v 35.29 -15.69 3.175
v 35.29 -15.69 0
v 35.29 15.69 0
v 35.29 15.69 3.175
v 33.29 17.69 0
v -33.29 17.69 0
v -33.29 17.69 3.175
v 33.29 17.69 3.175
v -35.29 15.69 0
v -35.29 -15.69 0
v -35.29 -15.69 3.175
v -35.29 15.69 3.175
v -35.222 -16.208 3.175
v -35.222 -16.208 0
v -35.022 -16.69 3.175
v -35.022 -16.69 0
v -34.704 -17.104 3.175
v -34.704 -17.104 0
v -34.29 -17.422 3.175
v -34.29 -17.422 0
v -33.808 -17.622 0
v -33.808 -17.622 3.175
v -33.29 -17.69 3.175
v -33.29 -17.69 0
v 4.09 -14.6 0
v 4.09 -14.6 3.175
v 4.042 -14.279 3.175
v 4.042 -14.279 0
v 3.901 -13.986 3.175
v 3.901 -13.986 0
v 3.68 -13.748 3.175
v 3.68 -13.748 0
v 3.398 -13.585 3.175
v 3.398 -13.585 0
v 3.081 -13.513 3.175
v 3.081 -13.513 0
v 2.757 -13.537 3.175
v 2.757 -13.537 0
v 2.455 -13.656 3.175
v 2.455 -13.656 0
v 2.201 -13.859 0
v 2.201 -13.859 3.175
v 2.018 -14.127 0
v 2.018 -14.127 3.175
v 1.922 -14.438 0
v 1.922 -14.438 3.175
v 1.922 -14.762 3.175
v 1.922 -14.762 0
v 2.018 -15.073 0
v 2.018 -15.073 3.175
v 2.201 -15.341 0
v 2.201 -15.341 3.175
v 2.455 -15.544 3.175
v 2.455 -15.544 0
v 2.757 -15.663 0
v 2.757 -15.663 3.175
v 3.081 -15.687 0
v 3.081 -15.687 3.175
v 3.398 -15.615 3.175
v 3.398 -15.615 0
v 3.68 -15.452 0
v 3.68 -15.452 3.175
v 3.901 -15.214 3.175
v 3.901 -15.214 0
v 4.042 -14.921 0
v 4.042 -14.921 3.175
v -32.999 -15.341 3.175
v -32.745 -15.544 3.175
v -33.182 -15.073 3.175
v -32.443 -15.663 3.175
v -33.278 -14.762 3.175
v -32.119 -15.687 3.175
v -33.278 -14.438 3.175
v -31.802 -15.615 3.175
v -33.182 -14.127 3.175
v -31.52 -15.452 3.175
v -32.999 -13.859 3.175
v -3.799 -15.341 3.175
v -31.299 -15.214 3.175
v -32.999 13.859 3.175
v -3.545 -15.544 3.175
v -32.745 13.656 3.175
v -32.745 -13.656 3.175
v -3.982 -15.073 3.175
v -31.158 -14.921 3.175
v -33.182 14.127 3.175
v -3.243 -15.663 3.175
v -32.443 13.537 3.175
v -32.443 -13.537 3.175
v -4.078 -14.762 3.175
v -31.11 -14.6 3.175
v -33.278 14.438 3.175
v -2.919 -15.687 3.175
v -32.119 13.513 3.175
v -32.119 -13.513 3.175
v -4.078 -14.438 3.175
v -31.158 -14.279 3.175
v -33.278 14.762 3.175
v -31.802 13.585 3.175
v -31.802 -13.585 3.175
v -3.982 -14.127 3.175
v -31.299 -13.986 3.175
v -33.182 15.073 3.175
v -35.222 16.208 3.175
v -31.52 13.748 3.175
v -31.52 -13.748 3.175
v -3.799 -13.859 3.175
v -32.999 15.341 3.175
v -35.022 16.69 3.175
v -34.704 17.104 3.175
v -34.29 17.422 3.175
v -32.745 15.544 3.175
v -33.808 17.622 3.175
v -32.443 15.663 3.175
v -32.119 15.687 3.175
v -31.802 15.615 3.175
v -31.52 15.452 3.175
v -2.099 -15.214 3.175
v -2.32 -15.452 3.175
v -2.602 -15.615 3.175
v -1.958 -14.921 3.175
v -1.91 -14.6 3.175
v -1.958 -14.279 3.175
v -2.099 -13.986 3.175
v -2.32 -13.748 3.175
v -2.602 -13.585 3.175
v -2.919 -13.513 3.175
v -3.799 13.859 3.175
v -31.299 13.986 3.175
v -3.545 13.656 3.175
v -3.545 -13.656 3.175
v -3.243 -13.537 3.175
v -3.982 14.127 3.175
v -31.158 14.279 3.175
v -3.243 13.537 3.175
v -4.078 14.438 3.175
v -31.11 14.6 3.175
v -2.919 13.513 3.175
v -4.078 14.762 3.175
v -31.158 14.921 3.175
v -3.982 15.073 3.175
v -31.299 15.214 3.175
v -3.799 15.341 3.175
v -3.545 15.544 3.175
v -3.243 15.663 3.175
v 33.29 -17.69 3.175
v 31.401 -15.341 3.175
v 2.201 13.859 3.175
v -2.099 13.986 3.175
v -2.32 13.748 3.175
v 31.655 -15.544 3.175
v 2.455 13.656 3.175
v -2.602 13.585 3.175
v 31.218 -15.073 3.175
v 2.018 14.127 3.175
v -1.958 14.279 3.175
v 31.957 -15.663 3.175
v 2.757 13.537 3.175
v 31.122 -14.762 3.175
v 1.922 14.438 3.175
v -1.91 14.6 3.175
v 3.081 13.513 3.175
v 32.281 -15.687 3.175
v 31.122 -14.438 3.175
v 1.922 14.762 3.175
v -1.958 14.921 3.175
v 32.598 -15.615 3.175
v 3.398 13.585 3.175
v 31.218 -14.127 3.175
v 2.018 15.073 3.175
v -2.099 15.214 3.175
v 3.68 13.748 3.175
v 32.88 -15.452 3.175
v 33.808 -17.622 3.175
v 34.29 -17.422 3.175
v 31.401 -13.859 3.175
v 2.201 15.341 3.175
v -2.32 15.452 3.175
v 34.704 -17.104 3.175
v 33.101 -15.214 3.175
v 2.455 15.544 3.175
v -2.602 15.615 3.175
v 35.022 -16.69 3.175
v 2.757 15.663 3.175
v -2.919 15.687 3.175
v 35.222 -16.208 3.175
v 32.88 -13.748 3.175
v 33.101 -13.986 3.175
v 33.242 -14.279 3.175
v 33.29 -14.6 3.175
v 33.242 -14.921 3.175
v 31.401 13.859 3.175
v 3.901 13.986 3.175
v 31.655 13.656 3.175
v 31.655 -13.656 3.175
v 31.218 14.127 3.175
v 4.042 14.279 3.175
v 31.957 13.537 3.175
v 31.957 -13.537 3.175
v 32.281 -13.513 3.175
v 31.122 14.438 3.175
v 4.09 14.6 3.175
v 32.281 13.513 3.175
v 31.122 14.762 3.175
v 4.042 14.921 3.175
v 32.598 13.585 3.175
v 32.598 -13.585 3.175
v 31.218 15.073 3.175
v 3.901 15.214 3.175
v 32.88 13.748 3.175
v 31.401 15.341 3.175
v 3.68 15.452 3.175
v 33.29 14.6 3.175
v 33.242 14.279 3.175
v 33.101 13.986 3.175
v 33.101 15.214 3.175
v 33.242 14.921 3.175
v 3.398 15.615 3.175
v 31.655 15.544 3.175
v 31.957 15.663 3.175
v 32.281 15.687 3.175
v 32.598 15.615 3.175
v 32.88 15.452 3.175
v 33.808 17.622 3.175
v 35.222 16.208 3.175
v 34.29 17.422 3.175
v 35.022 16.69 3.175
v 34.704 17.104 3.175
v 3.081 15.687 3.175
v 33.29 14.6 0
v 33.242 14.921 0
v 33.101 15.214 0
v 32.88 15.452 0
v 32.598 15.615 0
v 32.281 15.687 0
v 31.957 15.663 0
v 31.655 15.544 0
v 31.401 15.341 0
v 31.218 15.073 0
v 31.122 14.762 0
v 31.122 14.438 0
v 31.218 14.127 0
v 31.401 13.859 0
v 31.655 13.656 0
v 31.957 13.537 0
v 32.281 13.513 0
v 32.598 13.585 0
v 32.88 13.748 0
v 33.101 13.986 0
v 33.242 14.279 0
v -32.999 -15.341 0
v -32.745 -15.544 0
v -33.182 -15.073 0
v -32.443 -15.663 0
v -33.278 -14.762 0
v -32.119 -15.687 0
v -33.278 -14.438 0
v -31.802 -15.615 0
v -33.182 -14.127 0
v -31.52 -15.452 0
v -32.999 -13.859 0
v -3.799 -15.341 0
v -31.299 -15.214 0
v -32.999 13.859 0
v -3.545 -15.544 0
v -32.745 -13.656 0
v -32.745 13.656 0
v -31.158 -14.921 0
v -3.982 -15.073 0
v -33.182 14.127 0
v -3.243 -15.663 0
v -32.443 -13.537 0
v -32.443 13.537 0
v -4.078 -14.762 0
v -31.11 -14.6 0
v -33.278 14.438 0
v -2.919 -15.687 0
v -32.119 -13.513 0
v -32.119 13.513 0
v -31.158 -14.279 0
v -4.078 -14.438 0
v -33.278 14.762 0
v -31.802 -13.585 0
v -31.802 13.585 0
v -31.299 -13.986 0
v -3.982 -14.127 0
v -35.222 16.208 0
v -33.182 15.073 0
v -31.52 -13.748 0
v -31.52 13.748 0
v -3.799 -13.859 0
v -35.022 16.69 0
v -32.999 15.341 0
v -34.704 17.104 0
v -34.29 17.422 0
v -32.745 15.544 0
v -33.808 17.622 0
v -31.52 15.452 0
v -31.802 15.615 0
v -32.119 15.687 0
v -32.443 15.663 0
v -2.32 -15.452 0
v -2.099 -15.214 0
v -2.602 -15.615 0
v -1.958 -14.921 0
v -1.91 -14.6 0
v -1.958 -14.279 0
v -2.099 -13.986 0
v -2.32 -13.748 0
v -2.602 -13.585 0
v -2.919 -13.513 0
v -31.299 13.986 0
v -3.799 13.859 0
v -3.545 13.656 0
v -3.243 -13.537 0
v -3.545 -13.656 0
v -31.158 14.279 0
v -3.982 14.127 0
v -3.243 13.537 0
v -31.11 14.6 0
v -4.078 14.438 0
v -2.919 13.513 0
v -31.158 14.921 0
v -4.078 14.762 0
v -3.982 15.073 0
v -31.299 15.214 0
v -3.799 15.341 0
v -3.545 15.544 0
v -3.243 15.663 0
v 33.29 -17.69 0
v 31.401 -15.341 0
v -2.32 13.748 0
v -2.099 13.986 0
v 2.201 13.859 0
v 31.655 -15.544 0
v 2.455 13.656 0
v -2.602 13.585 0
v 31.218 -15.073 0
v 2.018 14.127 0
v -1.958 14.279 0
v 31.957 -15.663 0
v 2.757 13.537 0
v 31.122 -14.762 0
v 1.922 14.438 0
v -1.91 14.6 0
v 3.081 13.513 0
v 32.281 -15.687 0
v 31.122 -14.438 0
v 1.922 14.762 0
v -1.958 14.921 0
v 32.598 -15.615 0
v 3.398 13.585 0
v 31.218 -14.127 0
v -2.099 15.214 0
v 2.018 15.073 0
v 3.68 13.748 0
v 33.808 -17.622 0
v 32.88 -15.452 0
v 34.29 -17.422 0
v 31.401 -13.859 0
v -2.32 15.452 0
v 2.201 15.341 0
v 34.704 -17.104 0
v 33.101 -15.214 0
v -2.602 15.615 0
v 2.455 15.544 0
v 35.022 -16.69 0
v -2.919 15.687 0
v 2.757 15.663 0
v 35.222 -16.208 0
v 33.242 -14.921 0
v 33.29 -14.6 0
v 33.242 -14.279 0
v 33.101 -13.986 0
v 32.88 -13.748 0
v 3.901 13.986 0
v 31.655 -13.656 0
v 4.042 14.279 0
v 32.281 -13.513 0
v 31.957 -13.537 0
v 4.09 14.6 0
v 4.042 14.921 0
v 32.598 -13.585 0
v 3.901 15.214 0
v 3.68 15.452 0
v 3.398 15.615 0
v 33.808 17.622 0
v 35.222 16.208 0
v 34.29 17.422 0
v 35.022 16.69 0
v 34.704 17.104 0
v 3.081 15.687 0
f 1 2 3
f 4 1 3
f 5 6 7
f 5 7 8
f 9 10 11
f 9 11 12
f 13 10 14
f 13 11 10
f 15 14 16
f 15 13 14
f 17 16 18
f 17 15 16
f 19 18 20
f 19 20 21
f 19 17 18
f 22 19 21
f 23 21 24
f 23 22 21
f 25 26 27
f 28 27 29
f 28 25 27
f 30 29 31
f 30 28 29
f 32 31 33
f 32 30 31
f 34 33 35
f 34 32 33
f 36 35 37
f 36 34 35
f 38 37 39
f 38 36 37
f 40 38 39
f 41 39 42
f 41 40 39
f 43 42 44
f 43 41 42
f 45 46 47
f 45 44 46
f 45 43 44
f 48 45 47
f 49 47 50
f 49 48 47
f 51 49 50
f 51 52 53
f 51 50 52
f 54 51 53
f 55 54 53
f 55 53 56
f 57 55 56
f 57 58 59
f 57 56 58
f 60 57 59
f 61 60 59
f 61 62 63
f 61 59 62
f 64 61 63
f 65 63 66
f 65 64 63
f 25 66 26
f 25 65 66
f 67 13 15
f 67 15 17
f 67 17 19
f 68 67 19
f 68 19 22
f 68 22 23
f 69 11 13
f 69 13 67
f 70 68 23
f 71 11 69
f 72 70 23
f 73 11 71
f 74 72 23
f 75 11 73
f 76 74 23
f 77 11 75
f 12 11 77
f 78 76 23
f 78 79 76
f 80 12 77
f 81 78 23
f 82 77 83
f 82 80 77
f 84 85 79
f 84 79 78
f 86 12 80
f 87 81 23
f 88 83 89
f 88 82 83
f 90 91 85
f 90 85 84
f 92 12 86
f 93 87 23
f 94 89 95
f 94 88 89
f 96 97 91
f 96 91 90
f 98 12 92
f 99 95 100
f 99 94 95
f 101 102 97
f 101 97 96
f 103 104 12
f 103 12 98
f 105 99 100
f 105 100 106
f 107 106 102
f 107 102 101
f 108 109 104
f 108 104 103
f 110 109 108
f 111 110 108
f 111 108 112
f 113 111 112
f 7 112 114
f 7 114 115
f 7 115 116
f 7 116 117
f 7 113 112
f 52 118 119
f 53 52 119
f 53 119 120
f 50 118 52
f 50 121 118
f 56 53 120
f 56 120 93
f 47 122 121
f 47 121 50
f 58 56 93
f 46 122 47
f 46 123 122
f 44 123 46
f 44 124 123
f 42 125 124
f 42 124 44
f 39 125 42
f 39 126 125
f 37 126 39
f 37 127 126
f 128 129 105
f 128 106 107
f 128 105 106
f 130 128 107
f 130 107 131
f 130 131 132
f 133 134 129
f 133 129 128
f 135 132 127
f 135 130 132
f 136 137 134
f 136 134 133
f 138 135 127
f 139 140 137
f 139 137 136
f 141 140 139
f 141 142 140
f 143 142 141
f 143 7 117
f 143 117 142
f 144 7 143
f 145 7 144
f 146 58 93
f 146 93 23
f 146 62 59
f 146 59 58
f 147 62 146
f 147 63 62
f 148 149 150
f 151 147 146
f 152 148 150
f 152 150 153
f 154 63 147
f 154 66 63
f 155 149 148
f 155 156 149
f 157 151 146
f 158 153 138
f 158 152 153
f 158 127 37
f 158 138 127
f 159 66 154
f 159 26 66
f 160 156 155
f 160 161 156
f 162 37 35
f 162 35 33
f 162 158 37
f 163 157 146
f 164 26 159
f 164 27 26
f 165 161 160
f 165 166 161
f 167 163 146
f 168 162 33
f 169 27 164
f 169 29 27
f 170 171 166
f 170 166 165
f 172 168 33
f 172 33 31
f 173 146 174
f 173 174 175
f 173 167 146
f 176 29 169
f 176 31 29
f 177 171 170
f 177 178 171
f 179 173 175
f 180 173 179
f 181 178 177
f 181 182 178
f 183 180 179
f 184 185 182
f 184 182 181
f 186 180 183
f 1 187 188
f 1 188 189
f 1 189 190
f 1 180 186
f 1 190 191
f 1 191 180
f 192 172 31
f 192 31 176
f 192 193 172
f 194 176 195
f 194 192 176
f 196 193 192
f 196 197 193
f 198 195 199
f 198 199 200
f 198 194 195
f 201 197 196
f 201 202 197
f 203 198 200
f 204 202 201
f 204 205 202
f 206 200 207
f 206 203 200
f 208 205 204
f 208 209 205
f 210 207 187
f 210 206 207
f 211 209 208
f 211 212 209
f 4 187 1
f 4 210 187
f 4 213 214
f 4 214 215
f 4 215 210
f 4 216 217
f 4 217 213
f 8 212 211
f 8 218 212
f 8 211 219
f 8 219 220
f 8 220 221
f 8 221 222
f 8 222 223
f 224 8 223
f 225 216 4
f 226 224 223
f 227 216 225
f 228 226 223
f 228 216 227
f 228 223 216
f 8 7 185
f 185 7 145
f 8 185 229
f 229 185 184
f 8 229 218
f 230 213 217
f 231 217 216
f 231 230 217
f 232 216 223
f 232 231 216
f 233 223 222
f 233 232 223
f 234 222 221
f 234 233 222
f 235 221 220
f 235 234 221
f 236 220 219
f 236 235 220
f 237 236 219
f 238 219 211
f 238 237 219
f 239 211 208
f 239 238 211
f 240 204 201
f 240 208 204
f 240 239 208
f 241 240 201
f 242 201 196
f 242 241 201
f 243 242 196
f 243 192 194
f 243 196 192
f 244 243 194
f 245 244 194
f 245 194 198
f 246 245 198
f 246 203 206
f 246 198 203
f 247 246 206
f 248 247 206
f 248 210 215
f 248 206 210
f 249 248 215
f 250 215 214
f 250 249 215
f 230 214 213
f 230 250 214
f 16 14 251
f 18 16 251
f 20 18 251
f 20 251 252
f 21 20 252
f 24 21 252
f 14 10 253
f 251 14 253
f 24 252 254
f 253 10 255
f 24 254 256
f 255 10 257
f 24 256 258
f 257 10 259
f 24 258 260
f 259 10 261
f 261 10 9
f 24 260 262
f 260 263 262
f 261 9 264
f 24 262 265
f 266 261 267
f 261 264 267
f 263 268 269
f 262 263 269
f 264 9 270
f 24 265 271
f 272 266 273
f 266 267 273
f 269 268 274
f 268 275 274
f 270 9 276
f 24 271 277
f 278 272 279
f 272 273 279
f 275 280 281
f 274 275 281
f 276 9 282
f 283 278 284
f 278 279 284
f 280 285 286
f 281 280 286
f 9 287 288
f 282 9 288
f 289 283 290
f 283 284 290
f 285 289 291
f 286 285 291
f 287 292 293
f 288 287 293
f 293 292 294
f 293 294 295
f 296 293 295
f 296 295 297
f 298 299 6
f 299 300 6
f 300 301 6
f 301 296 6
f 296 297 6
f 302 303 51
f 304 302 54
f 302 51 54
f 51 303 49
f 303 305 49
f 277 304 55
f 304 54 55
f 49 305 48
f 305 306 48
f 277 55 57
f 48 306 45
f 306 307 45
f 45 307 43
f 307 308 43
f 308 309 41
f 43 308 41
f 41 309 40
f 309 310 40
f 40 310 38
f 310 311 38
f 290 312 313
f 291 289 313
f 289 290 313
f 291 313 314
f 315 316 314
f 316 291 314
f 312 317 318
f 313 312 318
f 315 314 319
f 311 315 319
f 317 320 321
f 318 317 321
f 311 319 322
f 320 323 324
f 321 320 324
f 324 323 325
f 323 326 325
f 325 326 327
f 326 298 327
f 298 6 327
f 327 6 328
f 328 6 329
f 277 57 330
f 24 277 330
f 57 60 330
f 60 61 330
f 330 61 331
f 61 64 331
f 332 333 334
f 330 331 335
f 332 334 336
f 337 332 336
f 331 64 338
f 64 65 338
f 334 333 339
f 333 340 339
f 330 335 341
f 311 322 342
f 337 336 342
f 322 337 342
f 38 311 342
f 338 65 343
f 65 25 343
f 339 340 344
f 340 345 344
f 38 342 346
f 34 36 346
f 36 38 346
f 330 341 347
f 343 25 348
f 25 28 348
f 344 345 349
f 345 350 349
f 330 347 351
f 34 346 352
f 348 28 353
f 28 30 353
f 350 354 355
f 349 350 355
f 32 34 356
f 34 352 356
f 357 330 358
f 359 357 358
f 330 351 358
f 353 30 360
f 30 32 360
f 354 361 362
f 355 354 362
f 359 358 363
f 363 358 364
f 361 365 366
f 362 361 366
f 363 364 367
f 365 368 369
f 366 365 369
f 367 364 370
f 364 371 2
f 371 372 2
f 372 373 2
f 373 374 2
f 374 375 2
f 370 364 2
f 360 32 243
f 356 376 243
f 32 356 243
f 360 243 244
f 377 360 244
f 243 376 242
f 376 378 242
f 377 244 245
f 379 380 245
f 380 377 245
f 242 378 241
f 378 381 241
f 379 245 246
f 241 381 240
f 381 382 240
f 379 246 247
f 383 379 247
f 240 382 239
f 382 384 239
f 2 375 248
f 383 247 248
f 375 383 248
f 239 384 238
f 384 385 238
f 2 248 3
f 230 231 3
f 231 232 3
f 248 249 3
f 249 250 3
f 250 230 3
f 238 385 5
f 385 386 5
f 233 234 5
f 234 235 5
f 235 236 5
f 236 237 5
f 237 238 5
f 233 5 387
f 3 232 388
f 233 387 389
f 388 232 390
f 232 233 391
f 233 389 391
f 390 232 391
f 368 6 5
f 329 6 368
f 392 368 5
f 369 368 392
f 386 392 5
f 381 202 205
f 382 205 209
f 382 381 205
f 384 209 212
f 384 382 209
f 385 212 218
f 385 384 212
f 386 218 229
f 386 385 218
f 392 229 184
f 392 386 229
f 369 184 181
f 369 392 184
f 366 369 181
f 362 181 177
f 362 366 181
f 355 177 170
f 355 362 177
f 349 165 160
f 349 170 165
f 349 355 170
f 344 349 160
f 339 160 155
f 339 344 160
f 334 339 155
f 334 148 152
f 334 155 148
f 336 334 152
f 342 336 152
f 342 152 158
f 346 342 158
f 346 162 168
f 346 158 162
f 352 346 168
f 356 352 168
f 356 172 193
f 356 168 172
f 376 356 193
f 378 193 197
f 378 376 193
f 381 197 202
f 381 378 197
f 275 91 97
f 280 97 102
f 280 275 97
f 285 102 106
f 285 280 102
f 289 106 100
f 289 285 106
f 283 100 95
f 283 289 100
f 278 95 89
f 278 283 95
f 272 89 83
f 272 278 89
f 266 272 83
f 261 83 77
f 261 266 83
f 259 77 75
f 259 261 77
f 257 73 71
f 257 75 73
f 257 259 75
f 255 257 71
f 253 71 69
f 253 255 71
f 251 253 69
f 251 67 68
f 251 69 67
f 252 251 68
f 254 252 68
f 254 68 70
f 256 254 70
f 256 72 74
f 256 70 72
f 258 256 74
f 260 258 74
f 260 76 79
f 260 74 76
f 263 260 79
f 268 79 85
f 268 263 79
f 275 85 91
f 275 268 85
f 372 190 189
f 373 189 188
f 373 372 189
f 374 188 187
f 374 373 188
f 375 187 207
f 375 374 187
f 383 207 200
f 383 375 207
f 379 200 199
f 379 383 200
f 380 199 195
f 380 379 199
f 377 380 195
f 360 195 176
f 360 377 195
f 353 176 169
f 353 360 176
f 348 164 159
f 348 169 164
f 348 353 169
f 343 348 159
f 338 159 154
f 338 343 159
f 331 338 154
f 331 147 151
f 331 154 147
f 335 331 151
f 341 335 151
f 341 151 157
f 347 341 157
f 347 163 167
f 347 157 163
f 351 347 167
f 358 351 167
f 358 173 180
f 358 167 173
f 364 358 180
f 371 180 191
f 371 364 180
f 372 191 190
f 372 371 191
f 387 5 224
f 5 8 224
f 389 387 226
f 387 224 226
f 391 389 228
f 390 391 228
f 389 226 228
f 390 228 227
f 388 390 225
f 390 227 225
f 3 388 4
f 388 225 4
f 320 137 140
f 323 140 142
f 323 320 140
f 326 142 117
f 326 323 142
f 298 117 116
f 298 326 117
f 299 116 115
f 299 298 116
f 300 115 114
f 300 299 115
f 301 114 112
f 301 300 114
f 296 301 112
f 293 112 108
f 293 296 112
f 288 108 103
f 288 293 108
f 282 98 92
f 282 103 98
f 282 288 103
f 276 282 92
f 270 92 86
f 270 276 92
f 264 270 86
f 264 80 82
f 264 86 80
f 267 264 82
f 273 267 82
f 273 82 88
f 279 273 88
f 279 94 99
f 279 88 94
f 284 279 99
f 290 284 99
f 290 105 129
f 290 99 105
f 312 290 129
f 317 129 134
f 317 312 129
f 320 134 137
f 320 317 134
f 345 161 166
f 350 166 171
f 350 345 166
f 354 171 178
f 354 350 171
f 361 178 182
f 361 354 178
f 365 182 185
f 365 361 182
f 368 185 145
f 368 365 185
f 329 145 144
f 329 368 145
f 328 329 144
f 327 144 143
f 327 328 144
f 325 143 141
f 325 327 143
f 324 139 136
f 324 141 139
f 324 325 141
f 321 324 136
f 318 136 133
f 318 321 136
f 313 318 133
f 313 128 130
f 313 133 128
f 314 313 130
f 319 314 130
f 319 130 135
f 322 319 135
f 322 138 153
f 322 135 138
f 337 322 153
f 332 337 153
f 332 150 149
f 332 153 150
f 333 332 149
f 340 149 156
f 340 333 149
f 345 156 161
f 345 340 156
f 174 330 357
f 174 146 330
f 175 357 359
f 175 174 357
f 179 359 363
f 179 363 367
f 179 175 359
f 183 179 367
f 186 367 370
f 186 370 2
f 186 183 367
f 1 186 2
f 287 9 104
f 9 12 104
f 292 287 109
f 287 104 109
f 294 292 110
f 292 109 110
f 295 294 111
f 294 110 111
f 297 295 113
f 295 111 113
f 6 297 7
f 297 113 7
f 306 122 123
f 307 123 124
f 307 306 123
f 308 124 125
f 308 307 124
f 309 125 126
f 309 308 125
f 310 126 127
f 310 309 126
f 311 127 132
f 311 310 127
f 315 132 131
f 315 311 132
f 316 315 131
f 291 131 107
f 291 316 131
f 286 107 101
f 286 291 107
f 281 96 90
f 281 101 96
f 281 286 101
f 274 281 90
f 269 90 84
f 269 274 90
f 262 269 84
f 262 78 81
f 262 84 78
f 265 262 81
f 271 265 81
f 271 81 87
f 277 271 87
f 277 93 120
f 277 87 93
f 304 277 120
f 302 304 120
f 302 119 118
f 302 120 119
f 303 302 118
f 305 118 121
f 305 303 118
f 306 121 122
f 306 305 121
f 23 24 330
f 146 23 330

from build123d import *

# Parameters (mm, degrees)
F1_W     = 70.58
F1_H     = 35.38
F2_DEPTH = 3.175
F0_R     = 1.09
F3_DEPTH = 3.176
F4_R     = 2


# Not quite as in the source:
# - a length typed as a fraction of an inch, garbled in the dataset ("3 / 203.2 mm" for 3/8 in), is restored


with BuildPart() as f2:
    # F1 (on Top) → F2 (new body)
    with BuildSketch(Plane.XY):
        Rectangle(F1_W, F1_H)
    extrude(amount=F2_DEPTH)

    # F0 (on Top) → F3 (cut, through all)
    with BuildSketch(Plane.XY):
        with Locations((-3, 14.6)):
            Circle(F0_R)
        with Locations((-3, -14.6)):
            Circle(F0_R)
        with Locations((-32.2, -14.6)):
            Circle(F0_R)
        with Locations((32.2, 14.6)):
            Circle(F0_R)
        with Locations((32.2, -14.6)):
            Circle(F0_R)
        with Locations((3, -14.6)):
            Circle(F0_R)
        with Locations((-32.2, 14.6)):
            Circle(F0_R)
        with Locations((3, 14.6)):
            Circle(F0_R)
    extrude(amount=F3_DEPTH, mode=Mode.SUBTRACT)

    # F4
    f4_edges = [f2.edges().sort_by_distance(p)[0] for p in [
        (-35.29, -17.69, 1.5875),
        (-35.29, 17.69, 1.5875),
        (35.29, 17.69, 1.5875),
        (35.29, -17.69, 1.5875),
    ]]
    fillet(f4_edges, radius=F4_R)


solid = f2.part
